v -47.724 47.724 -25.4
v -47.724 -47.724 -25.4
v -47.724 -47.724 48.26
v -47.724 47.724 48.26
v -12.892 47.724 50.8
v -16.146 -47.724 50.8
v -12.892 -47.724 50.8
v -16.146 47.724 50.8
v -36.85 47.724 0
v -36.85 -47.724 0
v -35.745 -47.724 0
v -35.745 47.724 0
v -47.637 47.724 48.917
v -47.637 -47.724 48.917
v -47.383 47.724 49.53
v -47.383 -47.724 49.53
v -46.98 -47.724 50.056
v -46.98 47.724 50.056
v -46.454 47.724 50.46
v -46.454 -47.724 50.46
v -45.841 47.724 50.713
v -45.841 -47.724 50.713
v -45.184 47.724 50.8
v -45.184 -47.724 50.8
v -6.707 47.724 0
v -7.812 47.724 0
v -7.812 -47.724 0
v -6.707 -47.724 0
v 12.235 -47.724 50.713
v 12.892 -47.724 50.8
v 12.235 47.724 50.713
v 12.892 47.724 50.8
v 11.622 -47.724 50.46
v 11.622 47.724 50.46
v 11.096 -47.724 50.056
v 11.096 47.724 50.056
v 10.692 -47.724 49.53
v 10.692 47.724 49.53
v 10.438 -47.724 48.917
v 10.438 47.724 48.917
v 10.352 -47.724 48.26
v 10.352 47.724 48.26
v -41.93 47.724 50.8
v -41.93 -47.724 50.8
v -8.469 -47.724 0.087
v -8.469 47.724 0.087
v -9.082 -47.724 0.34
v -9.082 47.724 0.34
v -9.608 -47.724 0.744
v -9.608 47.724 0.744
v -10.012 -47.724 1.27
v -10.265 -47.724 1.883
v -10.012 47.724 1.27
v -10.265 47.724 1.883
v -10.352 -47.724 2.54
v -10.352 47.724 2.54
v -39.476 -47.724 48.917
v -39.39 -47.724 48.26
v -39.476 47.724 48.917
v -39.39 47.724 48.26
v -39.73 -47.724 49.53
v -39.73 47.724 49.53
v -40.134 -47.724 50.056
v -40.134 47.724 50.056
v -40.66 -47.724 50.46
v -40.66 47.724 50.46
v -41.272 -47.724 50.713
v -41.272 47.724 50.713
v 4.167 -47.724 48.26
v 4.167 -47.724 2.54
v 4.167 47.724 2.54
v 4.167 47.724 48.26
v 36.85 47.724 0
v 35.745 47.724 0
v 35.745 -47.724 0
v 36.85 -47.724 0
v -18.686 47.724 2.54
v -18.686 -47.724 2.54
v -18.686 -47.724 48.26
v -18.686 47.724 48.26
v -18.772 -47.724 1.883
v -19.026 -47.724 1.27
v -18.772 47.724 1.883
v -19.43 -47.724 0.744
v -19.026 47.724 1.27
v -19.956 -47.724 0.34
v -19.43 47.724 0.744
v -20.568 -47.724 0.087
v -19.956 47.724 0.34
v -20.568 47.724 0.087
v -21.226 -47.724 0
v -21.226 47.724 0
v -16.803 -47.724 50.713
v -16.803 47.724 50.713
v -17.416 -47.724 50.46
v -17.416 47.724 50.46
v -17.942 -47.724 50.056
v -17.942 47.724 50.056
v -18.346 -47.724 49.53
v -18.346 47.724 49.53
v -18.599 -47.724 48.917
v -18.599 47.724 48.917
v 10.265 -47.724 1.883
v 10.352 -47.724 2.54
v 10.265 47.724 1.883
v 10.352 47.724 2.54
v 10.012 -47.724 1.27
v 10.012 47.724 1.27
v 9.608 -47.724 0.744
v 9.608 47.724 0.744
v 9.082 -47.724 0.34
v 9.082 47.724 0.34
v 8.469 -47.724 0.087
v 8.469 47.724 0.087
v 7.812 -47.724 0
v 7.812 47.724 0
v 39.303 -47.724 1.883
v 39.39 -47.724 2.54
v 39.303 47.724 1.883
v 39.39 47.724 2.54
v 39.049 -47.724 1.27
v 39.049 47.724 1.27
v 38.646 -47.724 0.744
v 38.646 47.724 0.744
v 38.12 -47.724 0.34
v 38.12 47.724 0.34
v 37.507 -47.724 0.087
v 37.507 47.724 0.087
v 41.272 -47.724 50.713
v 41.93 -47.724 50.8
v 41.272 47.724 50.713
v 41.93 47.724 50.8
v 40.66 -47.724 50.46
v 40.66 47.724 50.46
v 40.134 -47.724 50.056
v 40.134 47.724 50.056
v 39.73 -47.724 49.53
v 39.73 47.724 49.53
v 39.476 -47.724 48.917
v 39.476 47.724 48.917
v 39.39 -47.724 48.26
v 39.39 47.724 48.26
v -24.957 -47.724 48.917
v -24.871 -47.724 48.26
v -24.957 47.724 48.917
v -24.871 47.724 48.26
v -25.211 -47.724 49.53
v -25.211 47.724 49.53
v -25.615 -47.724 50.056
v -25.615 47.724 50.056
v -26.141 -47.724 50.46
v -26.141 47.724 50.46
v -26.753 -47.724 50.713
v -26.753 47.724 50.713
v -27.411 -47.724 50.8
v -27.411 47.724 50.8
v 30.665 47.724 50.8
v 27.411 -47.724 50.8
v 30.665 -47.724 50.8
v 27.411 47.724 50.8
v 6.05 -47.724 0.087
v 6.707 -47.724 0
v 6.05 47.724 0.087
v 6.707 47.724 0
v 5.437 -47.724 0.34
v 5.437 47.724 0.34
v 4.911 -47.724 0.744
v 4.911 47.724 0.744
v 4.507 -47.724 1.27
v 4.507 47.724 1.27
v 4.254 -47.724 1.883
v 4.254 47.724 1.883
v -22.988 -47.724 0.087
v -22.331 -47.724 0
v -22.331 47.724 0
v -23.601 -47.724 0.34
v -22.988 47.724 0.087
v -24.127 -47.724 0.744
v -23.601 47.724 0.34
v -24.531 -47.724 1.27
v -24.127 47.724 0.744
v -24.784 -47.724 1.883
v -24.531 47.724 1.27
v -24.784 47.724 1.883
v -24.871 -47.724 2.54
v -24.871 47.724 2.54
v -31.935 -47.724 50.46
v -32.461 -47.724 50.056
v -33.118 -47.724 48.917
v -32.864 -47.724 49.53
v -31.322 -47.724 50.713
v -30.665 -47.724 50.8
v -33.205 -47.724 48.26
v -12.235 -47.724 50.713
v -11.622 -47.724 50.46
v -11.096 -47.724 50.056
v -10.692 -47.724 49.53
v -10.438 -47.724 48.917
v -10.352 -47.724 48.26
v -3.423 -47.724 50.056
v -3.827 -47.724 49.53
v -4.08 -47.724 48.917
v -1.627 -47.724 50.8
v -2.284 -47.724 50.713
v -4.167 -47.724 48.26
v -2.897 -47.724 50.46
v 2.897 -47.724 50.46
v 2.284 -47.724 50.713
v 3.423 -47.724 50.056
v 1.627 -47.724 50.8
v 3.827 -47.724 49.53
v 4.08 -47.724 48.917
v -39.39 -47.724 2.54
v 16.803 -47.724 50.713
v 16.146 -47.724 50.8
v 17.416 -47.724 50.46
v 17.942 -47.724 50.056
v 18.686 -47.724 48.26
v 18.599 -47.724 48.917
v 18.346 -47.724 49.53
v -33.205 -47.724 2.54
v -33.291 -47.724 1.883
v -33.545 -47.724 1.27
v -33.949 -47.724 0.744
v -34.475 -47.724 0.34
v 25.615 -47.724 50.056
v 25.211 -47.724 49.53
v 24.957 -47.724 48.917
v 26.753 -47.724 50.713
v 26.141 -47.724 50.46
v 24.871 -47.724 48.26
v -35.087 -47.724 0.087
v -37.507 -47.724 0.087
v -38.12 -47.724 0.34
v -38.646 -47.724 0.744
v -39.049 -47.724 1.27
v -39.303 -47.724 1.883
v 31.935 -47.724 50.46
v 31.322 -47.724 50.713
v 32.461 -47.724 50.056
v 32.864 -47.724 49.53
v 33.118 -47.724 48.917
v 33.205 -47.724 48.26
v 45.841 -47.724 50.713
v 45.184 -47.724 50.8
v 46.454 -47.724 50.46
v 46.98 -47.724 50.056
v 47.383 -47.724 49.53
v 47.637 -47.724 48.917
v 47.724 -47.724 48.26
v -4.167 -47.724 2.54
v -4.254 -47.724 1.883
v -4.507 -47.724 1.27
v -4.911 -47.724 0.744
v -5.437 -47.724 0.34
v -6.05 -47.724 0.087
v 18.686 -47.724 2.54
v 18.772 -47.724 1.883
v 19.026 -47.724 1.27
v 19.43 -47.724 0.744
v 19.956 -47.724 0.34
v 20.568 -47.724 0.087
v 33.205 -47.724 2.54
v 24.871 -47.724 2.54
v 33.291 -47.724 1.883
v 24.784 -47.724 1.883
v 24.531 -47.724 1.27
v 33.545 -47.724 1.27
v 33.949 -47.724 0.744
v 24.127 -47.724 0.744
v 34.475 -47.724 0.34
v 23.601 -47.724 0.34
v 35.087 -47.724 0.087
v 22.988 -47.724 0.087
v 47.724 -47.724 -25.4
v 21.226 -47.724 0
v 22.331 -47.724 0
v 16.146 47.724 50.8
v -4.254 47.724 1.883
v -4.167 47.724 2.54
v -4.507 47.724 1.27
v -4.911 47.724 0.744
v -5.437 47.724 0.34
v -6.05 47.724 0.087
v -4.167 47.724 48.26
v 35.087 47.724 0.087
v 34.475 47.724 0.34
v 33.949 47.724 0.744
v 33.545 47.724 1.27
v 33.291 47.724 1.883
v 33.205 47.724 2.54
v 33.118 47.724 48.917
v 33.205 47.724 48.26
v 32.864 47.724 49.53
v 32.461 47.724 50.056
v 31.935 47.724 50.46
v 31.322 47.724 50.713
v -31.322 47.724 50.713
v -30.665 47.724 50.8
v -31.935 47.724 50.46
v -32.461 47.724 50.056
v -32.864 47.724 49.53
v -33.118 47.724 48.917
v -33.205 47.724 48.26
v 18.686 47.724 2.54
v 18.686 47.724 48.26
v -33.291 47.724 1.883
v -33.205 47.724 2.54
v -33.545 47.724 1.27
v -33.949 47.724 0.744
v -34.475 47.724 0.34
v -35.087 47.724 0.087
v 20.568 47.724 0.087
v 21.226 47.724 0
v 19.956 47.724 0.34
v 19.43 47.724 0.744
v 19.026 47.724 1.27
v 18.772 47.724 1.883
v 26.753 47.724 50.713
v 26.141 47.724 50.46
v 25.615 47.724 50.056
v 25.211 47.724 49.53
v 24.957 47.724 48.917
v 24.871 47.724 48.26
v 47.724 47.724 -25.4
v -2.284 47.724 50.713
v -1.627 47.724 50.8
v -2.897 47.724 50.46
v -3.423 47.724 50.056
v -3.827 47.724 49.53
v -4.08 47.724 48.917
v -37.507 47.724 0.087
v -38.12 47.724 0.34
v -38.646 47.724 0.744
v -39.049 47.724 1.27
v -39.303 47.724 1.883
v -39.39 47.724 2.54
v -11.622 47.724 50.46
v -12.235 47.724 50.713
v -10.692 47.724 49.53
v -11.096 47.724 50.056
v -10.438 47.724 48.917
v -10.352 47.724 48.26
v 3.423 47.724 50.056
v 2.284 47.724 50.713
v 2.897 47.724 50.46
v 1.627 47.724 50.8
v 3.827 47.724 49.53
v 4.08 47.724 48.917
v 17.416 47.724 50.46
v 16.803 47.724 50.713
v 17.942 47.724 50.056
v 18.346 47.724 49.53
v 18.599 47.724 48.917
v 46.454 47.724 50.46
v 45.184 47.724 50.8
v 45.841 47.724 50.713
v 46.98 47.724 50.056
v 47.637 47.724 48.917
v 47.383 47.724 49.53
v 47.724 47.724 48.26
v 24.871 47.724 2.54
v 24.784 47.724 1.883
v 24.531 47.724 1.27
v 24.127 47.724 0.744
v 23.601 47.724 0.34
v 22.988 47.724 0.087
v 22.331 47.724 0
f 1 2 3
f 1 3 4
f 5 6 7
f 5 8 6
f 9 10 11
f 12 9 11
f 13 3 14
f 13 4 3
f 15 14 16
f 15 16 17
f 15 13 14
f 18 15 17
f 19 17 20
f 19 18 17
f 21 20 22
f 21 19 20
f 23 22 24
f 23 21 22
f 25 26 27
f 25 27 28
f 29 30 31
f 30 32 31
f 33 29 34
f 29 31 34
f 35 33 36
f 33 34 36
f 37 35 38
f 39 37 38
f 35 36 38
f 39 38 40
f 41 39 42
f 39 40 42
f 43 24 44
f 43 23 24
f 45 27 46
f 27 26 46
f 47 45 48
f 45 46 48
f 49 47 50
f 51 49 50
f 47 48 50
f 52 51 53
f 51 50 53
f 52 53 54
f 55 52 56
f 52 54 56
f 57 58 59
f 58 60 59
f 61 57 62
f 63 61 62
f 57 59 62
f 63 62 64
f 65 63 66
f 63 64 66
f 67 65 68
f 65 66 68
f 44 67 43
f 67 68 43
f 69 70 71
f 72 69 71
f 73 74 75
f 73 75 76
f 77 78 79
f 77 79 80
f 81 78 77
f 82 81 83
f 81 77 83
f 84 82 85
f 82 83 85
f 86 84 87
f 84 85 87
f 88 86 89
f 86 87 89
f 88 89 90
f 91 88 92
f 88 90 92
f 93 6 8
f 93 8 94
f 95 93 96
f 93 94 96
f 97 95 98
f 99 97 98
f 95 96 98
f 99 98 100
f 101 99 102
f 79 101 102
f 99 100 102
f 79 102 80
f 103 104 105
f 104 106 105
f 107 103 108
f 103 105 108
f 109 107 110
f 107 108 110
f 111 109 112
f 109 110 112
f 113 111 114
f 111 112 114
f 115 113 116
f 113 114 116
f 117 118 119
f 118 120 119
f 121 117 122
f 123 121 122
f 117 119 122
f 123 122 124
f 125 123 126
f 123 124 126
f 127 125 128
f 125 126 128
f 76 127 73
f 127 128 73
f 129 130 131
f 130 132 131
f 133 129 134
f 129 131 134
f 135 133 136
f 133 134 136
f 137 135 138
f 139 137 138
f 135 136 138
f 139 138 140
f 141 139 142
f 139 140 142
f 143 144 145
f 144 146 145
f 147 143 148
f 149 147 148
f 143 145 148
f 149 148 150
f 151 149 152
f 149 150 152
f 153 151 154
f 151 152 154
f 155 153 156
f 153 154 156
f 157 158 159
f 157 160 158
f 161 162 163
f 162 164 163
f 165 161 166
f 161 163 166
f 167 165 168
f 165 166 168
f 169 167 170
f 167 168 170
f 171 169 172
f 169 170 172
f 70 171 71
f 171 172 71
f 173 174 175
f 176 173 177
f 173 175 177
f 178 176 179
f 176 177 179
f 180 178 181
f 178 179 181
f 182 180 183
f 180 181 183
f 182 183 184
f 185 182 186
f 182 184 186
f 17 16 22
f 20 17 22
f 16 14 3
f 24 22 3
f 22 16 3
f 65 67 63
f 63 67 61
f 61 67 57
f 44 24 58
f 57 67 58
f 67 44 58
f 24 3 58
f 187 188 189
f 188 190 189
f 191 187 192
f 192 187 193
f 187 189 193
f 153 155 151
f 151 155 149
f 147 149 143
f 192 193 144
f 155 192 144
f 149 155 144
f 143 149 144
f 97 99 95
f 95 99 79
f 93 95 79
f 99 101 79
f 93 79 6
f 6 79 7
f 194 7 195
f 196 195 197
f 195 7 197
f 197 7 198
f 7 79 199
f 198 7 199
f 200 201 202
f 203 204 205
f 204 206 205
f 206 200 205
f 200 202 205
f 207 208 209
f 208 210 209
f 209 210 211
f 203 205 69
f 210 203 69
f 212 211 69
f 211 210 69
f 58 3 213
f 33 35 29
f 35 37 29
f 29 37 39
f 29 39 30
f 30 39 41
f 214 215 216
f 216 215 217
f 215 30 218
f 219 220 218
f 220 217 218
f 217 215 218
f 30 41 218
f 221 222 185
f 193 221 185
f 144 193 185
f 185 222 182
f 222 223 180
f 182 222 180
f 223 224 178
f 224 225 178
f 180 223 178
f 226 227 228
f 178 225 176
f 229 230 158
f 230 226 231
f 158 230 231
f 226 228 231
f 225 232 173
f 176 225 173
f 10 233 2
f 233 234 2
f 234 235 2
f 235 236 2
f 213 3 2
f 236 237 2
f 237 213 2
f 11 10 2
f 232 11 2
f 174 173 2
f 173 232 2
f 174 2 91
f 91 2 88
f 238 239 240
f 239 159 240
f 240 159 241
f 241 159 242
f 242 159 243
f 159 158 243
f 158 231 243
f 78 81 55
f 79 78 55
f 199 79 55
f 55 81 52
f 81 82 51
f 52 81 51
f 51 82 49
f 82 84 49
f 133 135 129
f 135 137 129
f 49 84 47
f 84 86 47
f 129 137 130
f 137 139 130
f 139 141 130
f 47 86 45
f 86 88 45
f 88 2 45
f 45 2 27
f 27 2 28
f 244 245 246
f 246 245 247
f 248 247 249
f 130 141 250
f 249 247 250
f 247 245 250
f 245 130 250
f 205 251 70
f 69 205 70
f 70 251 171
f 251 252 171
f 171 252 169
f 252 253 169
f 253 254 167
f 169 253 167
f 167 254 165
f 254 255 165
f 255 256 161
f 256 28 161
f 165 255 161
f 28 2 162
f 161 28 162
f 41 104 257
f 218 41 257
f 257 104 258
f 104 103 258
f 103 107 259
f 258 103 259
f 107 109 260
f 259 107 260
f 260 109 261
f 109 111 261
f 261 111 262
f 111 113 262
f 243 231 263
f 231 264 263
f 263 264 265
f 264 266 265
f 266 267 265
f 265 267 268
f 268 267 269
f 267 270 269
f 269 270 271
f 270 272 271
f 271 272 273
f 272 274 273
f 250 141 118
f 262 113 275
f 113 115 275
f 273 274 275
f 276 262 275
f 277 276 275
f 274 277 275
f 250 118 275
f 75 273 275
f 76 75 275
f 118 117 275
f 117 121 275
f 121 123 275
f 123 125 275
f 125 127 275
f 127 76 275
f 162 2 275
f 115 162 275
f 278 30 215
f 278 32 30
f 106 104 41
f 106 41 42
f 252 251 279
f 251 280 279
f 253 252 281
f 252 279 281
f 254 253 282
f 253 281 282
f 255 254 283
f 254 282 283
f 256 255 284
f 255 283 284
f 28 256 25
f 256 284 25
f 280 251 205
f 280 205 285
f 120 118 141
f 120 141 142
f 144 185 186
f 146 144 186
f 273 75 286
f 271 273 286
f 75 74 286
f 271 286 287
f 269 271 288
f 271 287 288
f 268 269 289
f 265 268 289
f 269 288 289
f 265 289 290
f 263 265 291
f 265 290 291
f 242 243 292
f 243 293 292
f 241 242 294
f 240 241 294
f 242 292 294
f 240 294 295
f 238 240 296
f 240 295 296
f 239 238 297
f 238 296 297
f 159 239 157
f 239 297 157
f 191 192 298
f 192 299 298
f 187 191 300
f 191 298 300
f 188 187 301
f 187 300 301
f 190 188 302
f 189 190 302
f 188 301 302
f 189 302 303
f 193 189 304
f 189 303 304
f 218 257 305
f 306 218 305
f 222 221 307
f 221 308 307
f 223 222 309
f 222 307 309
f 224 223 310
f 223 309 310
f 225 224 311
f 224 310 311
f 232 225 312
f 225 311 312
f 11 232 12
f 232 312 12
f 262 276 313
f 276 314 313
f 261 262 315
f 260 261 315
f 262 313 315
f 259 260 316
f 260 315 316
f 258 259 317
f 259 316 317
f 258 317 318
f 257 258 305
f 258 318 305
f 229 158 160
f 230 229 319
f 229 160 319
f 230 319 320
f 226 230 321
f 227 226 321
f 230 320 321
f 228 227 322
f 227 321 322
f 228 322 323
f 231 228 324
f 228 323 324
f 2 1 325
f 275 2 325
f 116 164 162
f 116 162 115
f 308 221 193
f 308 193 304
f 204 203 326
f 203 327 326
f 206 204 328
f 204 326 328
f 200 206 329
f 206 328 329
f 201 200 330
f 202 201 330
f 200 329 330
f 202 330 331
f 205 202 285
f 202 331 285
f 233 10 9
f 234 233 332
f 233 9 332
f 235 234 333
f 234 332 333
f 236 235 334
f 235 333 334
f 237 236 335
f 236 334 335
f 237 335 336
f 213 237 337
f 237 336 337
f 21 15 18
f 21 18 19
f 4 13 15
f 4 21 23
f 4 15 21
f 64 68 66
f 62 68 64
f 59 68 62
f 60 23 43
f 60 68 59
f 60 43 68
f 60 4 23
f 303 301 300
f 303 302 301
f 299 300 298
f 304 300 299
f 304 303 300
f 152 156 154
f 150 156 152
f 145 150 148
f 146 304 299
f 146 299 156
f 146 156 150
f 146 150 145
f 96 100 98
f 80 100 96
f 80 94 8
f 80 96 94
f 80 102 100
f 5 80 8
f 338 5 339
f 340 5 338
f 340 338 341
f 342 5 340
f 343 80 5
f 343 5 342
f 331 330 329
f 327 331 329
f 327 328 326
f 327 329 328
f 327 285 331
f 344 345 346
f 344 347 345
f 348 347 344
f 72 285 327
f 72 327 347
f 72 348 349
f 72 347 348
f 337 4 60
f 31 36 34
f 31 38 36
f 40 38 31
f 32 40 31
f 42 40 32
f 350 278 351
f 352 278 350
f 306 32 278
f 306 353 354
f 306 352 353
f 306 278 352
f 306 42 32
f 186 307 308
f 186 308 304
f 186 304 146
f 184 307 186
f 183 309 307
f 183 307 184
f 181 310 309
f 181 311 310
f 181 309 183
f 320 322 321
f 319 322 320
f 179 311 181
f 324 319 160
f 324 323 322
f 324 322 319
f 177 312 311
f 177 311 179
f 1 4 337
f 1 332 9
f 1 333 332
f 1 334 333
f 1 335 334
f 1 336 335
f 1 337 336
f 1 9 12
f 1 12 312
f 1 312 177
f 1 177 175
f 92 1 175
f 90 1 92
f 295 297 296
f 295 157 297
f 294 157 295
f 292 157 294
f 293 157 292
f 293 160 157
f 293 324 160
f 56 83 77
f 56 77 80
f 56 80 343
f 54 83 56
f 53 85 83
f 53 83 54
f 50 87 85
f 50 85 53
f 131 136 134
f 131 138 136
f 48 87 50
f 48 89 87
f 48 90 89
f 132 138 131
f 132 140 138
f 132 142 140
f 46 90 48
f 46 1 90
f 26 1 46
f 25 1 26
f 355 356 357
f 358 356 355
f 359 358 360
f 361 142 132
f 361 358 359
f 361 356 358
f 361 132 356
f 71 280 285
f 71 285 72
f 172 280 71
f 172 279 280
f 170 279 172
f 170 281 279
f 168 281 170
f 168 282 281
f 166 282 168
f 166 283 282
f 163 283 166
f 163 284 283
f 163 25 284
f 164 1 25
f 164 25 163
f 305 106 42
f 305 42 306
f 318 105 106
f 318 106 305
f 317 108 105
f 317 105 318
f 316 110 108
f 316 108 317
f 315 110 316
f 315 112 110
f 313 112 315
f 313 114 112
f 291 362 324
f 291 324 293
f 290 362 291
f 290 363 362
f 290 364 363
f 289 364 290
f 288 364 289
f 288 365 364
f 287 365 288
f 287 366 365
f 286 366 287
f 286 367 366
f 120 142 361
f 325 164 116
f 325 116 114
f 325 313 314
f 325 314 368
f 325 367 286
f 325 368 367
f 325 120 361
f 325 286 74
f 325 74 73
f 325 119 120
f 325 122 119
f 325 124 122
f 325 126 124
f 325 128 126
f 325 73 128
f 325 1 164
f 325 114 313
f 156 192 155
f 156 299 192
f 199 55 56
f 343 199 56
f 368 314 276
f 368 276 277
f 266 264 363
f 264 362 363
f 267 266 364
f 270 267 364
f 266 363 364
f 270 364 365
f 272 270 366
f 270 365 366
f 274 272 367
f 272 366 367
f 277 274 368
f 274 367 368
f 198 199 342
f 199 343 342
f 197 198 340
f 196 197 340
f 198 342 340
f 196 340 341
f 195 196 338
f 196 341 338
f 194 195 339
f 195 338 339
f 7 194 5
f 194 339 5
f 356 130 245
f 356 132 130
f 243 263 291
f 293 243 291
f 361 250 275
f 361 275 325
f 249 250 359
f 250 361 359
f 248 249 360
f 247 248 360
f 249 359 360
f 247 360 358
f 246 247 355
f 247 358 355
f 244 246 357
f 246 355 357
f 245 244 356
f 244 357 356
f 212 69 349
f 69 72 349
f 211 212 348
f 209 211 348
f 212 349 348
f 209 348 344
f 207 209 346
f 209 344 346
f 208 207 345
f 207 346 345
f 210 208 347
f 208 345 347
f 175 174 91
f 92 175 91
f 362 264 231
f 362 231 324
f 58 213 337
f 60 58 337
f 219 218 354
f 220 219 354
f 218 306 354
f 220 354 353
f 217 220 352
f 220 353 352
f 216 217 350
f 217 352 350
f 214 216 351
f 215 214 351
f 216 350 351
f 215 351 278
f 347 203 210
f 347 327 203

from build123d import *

# Parameters (mm, degrees)
F0_W     = 8.333958
F0_H     = 95.447298
F0_W_2   = 6.184932
F1_DEPTH = 25.4
F2_DEPTH = 50.8
F3_R     = 2.54


with BuildPart() as f1:
    # F0 (on Top) → F1 (new body)
    with BuildSketch(Plane.XY):
        with Locations((-43.55667, 0)):
            Rectangle(F0_W, F0_H)
        with Locations((43.55667, 0)):
            Rectangle(F0_W, F0_H)
        with Locations((36.297225, 0)):
            Rectangle(F0_W_2, F0_H)
        with Locations((21.778335, 0)):
            Rectangle(F0_W_2, F0_H)
        with Locations((7.259445, 0)):
            Rectangle(F0_W_2, F0_H)
        with Locations((-7.259445, 0)):
            Rectangle(F0_W_2, F0_H)
        with Locations((-21.778335, 0)):
            Rectangle(F0_W_2, F0_H)
        with Locations((-36.297225, 0)):
            Rectangle(F0_W_2, F0_H)
        with Locations((-29.03778, 0)):
            Rectangle(F0_W, F0_H)
        with Locations((-14.51889, 0)):
            Rectangle(F0_W, F0_H)
        Rectangle(F0_W, F0_H)
        with Locations((14.51889, 0)):
            Rectangle(F0_W, F0_H)
        with Locations((29.03778, 0)):
            Rectangle(F0_W, F0_H)
    extrude(amount=-F1_DEPTH)

    # F0 (on Top) → F2 (join)
    with BuildSketch(Plane.XY):
        with Locations((-43.55667, 0)):
            Rectangle(F0_W, F0_H)
        with Locations((-29.03778, 0)):
            Rectangle(F0_W, F0_H)
        with Locations((-14.51889, 0)):
            Rectangle(F0_W, F0_H)
        Rectangle(F0_W, F0_H)
        with Locations((14.51889, 0)):
            Rectangle(F0_W, F0_H)
        with Locations((29.03778, 0)):
            Rectangle(F0_W, F0_H)
        with Locations((43.55667, 0)):
            Rectangle(F0_W, F0_H)
    extrude(amount=F2_DEPTH)

    # F3
    f3_edges = [f1.edges().sort_by_distance(p)[0] for p in [
        (-47.723649, 0, 50.8),
        (-39.389691, 0, 50.8),
        (-33.204759, 0, 50.8),
        (-24.870801, 0, 50.8),
        (-18.685869, 0, 50.8),
        (-10.351911, 0, 50.8),
        (-4.166979, 0, 50.8),
        (4.166979, 0, 50.8),
        (10.351911, 0, 50.8),
        (18.685869, 0, 50.8),
        (24.870801, 0, 50.8),
        (33.204759, 0, 50.8),
        (39.389691, 0, 50.8),
        (47.723649, 0, 50.8),
        (33.204759, 0, 0),
        (18.685869, 0, 0),
        (4.166979, 0, 0),
        (-10.351911, 0, 0),
        (-24.870801, 0, 0),
        (-39.389691, 0, 0),
        (-33.204759, 0, 0),
        (-18.685869, 0, 0),
        (-4.166979, 0, 0),
        (10.351911, 0, 0),
        (24.870801, 0, 0),
        (39.389691, 0, 0),
    ]]
    fillet(f3_edges, radius=F3_R)


solid = f1.part
